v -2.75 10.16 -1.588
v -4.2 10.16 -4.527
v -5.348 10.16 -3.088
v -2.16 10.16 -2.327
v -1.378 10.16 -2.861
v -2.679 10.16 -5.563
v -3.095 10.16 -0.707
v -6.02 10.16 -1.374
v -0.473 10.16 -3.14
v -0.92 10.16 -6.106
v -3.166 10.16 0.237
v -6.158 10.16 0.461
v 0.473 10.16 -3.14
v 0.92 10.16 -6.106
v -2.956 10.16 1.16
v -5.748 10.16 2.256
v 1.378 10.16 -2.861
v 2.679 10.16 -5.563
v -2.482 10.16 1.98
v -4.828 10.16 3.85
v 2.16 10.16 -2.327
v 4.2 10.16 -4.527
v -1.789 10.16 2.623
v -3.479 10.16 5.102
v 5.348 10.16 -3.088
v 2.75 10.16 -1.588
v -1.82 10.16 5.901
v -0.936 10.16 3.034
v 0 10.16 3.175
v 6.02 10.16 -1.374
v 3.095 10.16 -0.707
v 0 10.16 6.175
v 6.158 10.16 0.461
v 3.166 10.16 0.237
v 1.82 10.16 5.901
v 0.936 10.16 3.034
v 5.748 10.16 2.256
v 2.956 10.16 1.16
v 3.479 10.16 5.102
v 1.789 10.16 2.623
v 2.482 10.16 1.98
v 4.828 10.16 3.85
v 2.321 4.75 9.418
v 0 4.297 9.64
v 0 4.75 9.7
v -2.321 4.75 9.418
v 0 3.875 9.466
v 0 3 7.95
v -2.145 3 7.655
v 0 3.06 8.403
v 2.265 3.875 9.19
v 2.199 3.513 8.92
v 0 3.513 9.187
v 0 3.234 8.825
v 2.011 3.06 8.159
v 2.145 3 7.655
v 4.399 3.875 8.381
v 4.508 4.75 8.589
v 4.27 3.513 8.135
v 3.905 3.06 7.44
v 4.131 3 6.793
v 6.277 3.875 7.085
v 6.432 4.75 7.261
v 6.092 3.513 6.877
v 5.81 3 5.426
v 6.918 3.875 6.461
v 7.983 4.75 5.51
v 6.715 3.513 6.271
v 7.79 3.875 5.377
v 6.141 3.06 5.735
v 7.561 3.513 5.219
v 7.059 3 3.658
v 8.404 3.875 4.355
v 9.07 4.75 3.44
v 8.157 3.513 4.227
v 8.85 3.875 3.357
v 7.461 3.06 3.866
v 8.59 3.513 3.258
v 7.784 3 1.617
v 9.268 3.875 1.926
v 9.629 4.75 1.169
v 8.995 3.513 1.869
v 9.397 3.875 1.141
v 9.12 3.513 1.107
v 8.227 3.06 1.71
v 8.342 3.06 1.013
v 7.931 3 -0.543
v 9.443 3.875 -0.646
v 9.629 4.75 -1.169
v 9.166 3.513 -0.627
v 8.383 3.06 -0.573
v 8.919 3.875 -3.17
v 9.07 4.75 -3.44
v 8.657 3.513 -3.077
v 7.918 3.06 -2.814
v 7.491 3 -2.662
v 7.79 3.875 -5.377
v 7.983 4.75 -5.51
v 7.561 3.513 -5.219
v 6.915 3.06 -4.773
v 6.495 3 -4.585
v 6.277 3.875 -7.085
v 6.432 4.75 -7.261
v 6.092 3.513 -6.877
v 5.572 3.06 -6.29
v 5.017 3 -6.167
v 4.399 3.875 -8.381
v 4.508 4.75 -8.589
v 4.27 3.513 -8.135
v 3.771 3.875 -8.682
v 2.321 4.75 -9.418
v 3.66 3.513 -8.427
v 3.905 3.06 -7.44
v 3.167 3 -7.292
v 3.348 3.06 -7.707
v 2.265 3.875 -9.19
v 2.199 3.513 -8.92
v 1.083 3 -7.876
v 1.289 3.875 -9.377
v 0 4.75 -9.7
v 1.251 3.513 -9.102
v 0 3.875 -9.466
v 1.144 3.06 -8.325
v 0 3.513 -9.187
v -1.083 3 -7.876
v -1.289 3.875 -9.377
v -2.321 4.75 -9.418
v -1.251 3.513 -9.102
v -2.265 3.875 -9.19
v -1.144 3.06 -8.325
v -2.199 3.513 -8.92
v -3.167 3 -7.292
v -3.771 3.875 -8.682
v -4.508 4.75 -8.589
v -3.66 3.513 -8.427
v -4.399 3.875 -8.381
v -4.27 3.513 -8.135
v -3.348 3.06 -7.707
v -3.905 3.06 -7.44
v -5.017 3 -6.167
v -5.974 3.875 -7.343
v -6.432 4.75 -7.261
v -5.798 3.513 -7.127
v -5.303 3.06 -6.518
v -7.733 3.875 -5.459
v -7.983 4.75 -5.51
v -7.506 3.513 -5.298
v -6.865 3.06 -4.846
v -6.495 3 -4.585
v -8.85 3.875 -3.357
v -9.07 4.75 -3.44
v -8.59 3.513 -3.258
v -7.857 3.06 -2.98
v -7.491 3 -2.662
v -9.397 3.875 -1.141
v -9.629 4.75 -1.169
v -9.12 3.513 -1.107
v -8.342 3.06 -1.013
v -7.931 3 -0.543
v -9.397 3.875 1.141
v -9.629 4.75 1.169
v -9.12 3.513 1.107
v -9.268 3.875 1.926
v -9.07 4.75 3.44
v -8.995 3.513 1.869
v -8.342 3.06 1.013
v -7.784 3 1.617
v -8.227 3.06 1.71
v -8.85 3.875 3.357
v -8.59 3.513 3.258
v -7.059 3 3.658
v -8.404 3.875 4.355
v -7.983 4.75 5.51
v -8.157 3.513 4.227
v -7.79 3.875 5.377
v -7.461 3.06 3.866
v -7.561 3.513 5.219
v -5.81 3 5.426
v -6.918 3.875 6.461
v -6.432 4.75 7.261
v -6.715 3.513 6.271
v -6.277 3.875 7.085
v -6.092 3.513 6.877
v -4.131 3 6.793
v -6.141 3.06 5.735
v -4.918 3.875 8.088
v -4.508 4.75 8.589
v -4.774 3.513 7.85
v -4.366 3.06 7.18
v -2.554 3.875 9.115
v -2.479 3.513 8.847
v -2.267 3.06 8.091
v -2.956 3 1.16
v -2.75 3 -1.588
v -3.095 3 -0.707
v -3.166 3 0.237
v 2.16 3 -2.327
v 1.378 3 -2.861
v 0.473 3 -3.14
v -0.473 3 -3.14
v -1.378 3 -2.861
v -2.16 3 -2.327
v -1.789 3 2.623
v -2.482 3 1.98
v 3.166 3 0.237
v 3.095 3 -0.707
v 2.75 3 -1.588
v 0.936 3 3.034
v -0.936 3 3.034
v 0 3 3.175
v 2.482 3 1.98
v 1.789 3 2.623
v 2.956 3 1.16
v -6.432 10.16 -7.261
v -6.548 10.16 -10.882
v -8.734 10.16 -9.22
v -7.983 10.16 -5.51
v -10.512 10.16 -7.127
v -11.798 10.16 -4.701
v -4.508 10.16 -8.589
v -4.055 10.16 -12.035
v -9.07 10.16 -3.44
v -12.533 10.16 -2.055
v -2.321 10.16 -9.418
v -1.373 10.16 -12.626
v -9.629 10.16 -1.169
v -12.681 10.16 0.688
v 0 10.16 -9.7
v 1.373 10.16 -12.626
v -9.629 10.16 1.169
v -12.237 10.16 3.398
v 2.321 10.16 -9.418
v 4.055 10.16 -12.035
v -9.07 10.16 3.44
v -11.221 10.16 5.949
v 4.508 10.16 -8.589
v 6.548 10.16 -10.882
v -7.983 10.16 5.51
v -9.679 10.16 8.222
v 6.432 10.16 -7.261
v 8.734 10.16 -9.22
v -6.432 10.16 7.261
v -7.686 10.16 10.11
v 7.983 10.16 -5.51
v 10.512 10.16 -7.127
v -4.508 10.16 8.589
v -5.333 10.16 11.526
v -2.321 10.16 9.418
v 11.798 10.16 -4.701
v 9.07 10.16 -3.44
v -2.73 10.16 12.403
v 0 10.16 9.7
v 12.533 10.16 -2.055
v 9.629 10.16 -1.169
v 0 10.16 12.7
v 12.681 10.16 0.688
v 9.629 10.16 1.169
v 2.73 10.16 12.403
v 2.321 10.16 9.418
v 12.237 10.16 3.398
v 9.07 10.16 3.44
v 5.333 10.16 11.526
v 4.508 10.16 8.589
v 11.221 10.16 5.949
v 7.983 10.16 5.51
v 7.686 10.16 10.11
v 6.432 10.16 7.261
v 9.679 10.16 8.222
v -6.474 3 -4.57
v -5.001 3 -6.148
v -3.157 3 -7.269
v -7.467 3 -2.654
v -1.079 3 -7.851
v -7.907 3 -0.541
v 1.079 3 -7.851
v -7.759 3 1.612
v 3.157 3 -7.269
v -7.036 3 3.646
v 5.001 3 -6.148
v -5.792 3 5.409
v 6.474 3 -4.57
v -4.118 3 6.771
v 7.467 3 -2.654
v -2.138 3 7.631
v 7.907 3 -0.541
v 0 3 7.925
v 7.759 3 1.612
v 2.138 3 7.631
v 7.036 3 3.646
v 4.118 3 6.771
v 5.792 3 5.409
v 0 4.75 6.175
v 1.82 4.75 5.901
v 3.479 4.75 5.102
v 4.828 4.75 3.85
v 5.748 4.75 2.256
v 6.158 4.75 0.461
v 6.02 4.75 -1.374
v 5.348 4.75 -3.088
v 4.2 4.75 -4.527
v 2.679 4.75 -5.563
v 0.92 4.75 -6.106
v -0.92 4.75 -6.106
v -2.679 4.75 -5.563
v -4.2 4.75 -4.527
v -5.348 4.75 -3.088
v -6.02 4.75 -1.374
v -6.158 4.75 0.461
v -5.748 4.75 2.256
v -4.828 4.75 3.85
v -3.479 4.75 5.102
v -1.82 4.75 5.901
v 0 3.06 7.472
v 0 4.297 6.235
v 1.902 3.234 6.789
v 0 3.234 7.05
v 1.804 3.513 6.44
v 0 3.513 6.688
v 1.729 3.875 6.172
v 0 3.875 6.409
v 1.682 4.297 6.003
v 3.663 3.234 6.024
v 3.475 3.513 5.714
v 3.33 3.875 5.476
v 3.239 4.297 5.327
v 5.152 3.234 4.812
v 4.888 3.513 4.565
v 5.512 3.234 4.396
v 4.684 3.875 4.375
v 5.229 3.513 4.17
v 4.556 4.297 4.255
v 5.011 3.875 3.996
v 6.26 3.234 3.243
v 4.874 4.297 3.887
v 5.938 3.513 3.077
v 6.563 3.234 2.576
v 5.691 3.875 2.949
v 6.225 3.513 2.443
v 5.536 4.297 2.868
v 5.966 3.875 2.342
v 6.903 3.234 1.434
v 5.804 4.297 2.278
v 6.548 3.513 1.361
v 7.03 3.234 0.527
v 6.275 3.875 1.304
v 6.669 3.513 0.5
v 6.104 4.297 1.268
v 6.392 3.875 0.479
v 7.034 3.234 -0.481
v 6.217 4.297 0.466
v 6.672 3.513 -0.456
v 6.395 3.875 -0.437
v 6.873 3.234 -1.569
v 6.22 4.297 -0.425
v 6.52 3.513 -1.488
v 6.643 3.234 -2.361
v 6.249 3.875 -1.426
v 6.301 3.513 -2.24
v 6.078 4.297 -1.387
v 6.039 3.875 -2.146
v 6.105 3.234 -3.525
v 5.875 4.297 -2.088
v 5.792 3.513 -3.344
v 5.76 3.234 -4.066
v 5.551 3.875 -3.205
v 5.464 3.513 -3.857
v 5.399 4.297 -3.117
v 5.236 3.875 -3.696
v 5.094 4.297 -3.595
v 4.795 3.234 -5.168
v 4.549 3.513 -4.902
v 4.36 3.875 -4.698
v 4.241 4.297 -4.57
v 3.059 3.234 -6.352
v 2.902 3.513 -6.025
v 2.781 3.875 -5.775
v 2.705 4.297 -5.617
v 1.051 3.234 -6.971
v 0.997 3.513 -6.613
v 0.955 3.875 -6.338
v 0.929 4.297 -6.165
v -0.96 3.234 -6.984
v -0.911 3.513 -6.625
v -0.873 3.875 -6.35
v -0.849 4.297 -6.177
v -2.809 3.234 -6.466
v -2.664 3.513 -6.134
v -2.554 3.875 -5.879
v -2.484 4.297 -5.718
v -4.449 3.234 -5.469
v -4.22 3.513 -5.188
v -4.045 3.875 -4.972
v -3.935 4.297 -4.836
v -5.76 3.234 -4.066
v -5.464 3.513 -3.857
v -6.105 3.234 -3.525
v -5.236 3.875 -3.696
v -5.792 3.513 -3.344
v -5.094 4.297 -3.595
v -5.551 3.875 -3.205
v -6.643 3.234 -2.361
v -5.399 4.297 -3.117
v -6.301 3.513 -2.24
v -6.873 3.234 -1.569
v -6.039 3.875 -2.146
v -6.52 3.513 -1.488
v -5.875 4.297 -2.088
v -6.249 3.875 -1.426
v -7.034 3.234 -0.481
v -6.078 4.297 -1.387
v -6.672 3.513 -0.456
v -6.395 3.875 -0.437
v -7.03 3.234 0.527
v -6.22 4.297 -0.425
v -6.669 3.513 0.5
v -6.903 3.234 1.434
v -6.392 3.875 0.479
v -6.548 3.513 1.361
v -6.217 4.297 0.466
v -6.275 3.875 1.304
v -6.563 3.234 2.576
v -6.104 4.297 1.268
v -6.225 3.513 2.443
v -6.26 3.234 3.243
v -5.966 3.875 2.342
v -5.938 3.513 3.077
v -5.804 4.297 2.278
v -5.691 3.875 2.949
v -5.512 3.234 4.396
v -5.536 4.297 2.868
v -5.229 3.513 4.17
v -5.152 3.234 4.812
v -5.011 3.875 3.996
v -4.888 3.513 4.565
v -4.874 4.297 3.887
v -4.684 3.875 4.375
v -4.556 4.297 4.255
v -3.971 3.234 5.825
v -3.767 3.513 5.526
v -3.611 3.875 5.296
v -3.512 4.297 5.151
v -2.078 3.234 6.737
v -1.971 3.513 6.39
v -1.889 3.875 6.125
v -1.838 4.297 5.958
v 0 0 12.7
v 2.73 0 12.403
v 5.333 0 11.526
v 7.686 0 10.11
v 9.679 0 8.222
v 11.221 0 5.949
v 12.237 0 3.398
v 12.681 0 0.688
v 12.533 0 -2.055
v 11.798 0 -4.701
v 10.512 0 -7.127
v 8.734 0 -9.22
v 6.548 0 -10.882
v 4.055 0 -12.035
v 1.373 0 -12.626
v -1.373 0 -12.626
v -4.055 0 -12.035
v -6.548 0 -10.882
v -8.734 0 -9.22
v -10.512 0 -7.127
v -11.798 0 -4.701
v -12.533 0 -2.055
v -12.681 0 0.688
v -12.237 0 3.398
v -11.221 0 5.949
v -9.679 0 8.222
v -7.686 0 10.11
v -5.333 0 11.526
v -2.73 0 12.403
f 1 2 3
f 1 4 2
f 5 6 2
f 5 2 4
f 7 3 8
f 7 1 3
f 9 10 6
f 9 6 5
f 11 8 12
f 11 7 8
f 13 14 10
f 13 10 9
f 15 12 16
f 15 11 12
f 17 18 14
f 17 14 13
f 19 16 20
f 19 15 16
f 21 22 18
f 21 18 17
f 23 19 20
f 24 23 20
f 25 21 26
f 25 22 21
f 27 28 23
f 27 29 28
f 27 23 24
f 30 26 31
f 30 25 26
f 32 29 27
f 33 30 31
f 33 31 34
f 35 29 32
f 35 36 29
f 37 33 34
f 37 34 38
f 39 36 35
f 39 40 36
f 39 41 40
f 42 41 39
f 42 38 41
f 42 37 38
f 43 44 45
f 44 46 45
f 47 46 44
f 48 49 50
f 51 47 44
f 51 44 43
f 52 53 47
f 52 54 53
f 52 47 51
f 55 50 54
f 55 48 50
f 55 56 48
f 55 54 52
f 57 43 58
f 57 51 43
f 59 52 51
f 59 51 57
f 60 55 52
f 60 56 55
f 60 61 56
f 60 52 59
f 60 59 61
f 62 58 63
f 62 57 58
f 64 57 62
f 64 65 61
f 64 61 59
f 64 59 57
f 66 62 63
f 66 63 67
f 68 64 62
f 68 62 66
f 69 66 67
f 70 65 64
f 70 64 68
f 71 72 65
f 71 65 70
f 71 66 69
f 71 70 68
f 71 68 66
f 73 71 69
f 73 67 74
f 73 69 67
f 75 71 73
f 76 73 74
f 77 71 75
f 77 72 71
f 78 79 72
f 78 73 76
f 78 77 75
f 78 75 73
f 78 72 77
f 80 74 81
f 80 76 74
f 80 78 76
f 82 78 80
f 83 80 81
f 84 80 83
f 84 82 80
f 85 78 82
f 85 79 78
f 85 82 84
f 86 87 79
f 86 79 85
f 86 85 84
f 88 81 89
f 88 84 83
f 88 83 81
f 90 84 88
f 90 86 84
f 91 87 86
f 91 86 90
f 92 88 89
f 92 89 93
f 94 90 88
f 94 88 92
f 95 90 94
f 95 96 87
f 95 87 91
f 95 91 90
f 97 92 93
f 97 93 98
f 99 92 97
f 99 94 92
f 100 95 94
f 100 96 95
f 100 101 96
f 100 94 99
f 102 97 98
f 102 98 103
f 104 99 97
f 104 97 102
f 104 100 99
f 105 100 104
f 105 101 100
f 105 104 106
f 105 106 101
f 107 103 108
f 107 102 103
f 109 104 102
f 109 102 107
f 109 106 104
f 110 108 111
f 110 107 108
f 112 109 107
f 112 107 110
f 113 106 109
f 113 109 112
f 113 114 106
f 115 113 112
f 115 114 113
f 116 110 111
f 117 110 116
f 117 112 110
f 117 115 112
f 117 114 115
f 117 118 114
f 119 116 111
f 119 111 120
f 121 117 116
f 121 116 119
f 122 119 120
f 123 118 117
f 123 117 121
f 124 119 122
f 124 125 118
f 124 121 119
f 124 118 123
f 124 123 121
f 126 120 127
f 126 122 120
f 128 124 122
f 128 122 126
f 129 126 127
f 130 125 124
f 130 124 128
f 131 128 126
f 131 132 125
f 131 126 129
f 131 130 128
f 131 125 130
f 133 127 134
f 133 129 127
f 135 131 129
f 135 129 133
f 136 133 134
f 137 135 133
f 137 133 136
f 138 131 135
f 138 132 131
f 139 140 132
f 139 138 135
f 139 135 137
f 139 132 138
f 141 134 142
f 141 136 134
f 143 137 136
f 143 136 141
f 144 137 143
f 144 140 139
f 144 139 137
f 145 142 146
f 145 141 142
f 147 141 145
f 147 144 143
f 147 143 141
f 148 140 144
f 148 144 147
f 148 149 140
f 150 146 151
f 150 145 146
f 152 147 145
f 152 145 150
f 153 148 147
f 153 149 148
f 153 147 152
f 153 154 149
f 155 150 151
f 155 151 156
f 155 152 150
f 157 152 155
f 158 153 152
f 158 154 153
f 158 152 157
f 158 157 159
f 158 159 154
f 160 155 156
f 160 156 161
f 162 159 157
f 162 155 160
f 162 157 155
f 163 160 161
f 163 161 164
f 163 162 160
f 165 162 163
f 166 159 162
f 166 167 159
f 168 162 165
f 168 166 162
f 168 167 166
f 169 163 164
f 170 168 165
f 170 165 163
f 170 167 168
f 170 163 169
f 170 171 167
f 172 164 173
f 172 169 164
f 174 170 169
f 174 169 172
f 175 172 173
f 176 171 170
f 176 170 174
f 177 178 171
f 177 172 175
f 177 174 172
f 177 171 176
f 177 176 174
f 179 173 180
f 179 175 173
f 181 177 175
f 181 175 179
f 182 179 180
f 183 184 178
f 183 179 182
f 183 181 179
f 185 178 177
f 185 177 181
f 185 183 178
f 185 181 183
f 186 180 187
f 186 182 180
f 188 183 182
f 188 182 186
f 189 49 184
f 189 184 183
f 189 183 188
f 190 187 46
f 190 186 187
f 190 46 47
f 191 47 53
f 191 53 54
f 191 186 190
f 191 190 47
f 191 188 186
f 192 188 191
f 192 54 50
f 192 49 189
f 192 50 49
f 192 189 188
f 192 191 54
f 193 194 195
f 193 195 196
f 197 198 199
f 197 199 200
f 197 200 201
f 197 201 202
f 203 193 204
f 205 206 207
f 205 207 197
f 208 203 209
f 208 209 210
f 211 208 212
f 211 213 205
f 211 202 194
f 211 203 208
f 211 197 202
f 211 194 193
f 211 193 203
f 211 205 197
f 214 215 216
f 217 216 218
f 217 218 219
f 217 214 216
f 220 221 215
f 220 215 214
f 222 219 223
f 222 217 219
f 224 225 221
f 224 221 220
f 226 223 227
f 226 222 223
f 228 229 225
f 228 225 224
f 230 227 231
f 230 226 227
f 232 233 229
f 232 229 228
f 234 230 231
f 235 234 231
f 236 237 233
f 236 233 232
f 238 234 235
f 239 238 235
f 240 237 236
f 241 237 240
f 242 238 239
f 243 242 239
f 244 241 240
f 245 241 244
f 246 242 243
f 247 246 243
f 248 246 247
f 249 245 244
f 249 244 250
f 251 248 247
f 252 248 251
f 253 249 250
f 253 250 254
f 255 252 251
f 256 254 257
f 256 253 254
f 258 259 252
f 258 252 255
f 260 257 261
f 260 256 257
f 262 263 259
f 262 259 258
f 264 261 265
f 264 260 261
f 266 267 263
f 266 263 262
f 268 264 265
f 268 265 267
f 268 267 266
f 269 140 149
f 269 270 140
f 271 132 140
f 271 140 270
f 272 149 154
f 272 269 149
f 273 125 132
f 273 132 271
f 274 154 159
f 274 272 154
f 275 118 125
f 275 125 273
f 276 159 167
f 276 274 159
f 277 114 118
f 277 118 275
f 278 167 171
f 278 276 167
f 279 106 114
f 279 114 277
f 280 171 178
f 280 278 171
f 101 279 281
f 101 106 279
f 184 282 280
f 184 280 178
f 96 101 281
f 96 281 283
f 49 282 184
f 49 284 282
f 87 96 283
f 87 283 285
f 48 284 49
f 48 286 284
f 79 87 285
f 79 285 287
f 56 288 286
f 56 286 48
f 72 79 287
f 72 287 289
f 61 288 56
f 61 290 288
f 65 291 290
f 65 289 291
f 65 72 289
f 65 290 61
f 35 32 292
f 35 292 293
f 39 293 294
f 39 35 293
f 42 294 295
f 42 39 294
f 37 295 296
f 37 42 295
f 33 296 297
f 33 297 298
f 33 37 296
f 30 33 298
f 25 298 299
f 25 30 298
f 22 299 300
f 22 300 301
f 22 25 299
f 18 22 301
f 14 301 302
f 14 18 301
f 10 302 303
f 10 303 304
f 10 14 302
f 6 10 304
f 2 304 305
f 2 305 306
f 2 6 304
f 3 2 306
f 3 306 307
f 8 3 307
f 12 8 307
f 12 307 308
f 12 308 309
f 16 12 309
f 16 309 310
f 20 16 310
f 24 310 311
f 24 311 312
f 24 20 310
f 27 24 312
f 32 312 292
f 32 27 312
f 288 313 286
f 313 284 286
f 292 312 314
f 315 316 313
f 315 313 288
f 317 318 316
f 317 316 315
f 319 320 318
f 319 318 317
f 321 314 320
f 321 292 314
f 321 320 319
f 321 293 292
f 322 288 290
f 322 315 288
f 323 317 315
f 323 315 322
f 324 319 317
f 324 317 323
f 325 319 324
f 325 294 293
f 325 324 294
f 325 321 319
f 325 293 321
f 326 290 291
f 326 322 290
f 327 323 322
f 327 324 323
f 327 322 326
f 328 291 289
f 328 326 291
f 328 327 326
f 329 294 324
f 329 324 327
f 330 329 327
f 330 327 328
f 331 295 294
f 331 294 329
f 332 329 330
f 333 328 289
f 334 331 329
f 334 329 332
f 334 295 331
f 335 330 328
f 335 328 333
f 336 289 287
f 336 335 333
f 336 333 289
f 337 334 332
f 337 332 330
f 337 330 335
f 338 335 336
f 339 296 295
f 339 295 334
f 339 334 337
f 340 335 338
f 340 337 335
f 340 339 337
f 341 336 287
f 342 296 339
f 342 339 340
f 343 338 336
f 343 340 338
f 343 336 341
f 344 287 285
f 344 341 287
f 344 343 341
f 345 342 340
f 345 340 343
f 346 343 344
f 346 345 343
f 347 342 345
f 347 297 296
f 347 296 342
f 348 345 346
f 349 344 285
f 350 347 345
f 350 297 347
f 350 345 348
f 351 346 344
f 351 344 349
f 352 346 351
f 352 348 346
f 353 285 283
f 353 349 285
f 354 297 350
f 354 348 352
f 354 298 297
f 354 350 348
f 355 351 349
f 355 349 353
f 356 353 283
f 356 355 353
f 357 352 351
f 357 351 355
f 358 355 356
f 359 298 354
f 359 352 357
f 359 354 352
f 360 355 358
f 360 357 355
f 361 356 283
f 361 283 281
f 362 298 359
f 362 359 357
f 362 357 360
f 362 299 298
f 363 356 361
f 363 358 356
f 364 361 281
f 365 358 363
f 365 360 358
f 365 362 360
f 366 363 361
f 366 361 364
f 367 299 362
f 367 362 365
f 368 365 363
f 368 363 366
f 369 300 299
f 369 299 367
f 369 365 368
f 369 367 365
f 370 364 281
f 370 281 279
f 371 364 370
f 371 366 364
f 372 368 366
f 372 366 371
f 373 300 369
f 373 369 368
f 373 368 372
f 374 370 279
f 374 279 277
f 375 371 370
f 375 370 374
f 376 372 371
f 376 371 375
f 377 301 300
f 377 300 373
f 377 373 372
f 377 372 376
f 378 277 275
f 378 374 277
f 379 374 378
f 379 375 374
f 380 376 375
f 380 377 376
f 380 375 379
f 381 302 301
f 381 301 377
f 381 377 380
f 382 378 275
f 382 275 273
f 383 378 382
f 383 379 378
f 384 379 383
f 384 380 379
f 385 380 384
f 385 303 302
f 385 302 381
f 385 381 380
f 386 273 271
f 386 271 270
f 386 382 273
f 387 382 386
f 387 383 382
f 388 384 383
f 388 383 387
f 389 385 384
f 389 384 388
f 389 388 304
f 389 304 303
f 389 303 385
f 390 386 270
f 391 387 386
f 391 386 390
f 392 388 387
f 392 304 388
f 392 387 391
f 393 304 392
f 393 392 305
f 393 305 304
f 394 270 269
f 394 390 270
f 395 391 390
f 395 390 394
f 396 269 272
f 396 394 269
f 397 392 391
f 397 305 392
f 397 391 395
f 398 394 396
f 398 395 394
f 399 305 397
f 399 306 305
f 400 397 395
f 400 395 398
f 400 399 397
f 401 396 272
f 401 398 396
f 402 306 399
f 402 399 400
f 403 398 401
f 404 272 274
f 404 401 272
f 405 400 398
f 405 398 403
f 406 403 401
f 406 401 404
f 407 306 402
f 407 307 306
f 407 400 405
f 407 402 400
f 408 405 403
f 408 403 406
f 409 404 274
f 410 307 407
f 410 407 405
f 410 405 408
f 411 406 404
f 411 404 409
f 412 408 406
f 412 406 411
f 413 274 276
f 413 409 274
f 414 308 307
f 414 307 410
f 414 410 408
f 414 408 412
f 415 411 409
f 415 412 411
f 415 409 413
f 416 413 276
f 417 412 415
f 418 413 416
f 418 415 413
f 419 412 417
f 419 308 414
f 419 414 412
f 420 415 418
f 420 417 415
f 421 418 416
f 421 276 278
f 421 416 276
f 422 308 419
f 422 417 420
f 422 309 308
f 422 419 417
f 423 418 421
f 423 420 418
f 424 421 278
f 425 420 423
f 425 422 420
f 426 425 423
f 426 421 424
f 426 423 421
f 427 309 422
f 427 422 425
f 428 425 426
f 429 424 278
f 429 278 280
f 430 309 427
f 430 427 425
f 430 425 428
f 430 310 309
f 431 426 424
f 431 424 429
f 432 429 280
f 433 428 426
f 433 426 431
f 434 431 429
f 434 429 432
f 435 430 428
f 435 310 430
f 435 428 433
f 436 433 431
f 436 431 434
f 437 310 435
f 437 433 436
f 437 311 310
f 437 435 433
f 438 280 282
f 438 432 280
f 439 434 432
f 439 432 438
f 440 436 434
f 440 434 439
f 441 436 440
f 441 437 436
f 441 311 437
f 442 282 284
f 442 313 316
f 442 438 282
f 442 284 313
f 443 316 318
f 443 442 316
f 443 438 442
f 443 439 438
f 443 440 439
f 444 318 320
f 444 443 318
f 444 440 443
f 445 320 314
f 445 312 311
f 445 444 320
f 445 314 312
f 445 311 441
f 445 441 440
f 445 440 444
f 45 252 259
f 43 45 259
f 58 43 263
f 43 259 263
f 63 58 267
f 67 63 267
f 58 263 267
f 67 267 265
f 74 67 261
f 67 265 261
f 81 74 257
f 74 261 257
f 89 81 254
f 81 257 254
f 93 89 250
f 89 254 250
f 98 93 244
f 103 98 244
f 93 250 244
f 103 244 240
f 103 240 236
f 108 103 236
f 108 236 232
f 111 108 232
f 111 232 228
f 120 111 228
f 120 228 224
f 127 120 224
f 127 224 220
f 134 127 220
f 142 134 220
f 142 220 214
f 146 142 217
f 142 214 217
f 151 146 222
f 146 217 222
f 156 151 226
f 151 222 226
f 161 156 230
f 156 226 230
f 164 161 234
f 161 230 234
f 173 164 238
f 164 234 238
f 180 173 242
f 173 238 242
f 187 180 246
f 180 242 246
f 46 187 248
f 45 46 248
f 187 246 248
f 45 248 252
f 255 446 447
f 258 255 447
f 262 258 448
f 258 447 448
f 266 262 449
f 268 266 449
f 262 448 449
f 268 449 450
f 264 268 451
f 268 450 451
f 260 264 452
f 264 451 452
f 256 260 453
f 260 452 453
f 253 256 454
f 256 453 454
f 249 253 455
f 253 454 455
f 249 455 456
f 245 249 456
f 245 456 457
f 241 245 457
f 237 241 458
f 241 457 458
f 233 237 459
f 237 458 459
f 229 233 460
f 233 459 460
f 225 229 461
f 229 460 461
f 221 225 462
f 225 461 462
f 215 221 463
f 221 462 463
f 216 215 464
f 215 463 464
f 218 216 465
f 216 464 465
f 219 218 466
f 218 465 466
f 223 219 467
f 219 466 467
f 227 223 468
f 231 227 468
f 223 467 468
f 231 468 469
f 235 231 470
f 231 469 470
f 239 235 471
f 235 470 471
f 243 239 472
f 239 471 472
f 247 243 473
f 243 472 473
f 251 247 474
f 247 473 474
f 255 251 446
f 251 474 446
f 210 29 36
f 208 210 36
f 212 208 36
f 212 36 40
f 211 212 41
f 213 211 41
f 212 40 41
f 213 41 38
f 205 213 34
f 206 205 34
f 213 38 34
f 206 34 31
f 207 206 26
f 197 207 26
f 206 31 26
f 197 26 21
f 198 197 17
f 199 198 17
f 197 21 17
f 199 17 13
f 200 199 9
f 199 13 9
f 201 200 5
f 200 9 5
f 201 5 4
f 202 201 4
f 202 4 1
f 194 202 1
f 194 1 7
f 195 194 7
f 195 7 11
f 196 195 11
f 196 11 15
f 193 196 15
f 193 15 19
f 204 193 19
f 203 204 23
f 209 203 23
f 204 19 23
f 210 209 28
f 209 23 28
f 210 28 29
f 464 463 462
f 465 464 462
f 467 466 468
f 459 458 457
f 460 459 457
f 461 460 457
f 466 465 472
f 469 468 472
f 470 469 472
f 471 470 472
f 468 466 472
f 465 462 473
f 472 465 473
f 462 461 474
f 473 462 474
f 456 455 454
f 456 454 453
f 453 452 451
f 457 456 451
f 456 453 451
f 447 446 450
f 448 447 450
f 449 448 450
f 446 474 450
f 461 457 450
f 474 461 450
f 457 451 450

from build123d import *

# Parameters (mm, degrees)
SKETCH1_R           = 12.7
BOSS_EXTRUDE1_DEPTH = 10.16
SKETCH2_R           = 9.7
SKETCH2_R_2         = 6.175
SKETCH2_R_3         = 3.175
CUT_EXTRUDE1_DEPTH  = 7.16
FILLET1_R           = 1.75


with BuildPart() as part:
    # Sketch1 → Boss-Extrude1 (new body)
    with BuildSketch(Plane(origin=(0, 0, 0), x_dir=(1, 0, 0), z_dir=(0, 1, 0))):
        with Locations(Location((0, 0, 0), (0, 0, 270))):
            Circle(SKETCH1_R)
    extrude(amount=BOSS_EXTRUDE1_DEPTH)

    # Sketch2 → Cut-Extrude1 (cut)
    # profile 1 of 2: a face of its own
    with BuildSketch(Plane(origin=(0, 10.16, 0), x_dir=(1, 0, 0), z_dir=(0, 1, 0))):
        with Locations(Location((0, 0, 0), (0, 0, 270))):
            Circle(SKETCH2_R)
        with Locations(Location((0, 0, 0), (0, 0, 270))):
            Circle(SKETCH2_R_2, mode=Mode.SUBTRACT)
    # profile 2 of 2: a face of its own
    with BuildSketch(Plane(origin=(0, 10.16, 0), x_dir=(1, 0, 0), z_dir=(0, 1, 0))):
        with Locations(Location((0, 0, 0), (0, 0, 270))):
            Circle(SKETCH2_R_3)
    extrude(amount=-CUT_EXTRUDE1_DEPTH, mode=Mode.SUBTRACT)

    # Fillet1
    fillet1_edges = [part.edges().sort_by_distance(p)[0] for p in [
        (0, 3, -6.175),
        (0, 3, -9.7),
    ]]
    fillet(fillet1_edges, radius=FILLET1_R)


solid = part.part
